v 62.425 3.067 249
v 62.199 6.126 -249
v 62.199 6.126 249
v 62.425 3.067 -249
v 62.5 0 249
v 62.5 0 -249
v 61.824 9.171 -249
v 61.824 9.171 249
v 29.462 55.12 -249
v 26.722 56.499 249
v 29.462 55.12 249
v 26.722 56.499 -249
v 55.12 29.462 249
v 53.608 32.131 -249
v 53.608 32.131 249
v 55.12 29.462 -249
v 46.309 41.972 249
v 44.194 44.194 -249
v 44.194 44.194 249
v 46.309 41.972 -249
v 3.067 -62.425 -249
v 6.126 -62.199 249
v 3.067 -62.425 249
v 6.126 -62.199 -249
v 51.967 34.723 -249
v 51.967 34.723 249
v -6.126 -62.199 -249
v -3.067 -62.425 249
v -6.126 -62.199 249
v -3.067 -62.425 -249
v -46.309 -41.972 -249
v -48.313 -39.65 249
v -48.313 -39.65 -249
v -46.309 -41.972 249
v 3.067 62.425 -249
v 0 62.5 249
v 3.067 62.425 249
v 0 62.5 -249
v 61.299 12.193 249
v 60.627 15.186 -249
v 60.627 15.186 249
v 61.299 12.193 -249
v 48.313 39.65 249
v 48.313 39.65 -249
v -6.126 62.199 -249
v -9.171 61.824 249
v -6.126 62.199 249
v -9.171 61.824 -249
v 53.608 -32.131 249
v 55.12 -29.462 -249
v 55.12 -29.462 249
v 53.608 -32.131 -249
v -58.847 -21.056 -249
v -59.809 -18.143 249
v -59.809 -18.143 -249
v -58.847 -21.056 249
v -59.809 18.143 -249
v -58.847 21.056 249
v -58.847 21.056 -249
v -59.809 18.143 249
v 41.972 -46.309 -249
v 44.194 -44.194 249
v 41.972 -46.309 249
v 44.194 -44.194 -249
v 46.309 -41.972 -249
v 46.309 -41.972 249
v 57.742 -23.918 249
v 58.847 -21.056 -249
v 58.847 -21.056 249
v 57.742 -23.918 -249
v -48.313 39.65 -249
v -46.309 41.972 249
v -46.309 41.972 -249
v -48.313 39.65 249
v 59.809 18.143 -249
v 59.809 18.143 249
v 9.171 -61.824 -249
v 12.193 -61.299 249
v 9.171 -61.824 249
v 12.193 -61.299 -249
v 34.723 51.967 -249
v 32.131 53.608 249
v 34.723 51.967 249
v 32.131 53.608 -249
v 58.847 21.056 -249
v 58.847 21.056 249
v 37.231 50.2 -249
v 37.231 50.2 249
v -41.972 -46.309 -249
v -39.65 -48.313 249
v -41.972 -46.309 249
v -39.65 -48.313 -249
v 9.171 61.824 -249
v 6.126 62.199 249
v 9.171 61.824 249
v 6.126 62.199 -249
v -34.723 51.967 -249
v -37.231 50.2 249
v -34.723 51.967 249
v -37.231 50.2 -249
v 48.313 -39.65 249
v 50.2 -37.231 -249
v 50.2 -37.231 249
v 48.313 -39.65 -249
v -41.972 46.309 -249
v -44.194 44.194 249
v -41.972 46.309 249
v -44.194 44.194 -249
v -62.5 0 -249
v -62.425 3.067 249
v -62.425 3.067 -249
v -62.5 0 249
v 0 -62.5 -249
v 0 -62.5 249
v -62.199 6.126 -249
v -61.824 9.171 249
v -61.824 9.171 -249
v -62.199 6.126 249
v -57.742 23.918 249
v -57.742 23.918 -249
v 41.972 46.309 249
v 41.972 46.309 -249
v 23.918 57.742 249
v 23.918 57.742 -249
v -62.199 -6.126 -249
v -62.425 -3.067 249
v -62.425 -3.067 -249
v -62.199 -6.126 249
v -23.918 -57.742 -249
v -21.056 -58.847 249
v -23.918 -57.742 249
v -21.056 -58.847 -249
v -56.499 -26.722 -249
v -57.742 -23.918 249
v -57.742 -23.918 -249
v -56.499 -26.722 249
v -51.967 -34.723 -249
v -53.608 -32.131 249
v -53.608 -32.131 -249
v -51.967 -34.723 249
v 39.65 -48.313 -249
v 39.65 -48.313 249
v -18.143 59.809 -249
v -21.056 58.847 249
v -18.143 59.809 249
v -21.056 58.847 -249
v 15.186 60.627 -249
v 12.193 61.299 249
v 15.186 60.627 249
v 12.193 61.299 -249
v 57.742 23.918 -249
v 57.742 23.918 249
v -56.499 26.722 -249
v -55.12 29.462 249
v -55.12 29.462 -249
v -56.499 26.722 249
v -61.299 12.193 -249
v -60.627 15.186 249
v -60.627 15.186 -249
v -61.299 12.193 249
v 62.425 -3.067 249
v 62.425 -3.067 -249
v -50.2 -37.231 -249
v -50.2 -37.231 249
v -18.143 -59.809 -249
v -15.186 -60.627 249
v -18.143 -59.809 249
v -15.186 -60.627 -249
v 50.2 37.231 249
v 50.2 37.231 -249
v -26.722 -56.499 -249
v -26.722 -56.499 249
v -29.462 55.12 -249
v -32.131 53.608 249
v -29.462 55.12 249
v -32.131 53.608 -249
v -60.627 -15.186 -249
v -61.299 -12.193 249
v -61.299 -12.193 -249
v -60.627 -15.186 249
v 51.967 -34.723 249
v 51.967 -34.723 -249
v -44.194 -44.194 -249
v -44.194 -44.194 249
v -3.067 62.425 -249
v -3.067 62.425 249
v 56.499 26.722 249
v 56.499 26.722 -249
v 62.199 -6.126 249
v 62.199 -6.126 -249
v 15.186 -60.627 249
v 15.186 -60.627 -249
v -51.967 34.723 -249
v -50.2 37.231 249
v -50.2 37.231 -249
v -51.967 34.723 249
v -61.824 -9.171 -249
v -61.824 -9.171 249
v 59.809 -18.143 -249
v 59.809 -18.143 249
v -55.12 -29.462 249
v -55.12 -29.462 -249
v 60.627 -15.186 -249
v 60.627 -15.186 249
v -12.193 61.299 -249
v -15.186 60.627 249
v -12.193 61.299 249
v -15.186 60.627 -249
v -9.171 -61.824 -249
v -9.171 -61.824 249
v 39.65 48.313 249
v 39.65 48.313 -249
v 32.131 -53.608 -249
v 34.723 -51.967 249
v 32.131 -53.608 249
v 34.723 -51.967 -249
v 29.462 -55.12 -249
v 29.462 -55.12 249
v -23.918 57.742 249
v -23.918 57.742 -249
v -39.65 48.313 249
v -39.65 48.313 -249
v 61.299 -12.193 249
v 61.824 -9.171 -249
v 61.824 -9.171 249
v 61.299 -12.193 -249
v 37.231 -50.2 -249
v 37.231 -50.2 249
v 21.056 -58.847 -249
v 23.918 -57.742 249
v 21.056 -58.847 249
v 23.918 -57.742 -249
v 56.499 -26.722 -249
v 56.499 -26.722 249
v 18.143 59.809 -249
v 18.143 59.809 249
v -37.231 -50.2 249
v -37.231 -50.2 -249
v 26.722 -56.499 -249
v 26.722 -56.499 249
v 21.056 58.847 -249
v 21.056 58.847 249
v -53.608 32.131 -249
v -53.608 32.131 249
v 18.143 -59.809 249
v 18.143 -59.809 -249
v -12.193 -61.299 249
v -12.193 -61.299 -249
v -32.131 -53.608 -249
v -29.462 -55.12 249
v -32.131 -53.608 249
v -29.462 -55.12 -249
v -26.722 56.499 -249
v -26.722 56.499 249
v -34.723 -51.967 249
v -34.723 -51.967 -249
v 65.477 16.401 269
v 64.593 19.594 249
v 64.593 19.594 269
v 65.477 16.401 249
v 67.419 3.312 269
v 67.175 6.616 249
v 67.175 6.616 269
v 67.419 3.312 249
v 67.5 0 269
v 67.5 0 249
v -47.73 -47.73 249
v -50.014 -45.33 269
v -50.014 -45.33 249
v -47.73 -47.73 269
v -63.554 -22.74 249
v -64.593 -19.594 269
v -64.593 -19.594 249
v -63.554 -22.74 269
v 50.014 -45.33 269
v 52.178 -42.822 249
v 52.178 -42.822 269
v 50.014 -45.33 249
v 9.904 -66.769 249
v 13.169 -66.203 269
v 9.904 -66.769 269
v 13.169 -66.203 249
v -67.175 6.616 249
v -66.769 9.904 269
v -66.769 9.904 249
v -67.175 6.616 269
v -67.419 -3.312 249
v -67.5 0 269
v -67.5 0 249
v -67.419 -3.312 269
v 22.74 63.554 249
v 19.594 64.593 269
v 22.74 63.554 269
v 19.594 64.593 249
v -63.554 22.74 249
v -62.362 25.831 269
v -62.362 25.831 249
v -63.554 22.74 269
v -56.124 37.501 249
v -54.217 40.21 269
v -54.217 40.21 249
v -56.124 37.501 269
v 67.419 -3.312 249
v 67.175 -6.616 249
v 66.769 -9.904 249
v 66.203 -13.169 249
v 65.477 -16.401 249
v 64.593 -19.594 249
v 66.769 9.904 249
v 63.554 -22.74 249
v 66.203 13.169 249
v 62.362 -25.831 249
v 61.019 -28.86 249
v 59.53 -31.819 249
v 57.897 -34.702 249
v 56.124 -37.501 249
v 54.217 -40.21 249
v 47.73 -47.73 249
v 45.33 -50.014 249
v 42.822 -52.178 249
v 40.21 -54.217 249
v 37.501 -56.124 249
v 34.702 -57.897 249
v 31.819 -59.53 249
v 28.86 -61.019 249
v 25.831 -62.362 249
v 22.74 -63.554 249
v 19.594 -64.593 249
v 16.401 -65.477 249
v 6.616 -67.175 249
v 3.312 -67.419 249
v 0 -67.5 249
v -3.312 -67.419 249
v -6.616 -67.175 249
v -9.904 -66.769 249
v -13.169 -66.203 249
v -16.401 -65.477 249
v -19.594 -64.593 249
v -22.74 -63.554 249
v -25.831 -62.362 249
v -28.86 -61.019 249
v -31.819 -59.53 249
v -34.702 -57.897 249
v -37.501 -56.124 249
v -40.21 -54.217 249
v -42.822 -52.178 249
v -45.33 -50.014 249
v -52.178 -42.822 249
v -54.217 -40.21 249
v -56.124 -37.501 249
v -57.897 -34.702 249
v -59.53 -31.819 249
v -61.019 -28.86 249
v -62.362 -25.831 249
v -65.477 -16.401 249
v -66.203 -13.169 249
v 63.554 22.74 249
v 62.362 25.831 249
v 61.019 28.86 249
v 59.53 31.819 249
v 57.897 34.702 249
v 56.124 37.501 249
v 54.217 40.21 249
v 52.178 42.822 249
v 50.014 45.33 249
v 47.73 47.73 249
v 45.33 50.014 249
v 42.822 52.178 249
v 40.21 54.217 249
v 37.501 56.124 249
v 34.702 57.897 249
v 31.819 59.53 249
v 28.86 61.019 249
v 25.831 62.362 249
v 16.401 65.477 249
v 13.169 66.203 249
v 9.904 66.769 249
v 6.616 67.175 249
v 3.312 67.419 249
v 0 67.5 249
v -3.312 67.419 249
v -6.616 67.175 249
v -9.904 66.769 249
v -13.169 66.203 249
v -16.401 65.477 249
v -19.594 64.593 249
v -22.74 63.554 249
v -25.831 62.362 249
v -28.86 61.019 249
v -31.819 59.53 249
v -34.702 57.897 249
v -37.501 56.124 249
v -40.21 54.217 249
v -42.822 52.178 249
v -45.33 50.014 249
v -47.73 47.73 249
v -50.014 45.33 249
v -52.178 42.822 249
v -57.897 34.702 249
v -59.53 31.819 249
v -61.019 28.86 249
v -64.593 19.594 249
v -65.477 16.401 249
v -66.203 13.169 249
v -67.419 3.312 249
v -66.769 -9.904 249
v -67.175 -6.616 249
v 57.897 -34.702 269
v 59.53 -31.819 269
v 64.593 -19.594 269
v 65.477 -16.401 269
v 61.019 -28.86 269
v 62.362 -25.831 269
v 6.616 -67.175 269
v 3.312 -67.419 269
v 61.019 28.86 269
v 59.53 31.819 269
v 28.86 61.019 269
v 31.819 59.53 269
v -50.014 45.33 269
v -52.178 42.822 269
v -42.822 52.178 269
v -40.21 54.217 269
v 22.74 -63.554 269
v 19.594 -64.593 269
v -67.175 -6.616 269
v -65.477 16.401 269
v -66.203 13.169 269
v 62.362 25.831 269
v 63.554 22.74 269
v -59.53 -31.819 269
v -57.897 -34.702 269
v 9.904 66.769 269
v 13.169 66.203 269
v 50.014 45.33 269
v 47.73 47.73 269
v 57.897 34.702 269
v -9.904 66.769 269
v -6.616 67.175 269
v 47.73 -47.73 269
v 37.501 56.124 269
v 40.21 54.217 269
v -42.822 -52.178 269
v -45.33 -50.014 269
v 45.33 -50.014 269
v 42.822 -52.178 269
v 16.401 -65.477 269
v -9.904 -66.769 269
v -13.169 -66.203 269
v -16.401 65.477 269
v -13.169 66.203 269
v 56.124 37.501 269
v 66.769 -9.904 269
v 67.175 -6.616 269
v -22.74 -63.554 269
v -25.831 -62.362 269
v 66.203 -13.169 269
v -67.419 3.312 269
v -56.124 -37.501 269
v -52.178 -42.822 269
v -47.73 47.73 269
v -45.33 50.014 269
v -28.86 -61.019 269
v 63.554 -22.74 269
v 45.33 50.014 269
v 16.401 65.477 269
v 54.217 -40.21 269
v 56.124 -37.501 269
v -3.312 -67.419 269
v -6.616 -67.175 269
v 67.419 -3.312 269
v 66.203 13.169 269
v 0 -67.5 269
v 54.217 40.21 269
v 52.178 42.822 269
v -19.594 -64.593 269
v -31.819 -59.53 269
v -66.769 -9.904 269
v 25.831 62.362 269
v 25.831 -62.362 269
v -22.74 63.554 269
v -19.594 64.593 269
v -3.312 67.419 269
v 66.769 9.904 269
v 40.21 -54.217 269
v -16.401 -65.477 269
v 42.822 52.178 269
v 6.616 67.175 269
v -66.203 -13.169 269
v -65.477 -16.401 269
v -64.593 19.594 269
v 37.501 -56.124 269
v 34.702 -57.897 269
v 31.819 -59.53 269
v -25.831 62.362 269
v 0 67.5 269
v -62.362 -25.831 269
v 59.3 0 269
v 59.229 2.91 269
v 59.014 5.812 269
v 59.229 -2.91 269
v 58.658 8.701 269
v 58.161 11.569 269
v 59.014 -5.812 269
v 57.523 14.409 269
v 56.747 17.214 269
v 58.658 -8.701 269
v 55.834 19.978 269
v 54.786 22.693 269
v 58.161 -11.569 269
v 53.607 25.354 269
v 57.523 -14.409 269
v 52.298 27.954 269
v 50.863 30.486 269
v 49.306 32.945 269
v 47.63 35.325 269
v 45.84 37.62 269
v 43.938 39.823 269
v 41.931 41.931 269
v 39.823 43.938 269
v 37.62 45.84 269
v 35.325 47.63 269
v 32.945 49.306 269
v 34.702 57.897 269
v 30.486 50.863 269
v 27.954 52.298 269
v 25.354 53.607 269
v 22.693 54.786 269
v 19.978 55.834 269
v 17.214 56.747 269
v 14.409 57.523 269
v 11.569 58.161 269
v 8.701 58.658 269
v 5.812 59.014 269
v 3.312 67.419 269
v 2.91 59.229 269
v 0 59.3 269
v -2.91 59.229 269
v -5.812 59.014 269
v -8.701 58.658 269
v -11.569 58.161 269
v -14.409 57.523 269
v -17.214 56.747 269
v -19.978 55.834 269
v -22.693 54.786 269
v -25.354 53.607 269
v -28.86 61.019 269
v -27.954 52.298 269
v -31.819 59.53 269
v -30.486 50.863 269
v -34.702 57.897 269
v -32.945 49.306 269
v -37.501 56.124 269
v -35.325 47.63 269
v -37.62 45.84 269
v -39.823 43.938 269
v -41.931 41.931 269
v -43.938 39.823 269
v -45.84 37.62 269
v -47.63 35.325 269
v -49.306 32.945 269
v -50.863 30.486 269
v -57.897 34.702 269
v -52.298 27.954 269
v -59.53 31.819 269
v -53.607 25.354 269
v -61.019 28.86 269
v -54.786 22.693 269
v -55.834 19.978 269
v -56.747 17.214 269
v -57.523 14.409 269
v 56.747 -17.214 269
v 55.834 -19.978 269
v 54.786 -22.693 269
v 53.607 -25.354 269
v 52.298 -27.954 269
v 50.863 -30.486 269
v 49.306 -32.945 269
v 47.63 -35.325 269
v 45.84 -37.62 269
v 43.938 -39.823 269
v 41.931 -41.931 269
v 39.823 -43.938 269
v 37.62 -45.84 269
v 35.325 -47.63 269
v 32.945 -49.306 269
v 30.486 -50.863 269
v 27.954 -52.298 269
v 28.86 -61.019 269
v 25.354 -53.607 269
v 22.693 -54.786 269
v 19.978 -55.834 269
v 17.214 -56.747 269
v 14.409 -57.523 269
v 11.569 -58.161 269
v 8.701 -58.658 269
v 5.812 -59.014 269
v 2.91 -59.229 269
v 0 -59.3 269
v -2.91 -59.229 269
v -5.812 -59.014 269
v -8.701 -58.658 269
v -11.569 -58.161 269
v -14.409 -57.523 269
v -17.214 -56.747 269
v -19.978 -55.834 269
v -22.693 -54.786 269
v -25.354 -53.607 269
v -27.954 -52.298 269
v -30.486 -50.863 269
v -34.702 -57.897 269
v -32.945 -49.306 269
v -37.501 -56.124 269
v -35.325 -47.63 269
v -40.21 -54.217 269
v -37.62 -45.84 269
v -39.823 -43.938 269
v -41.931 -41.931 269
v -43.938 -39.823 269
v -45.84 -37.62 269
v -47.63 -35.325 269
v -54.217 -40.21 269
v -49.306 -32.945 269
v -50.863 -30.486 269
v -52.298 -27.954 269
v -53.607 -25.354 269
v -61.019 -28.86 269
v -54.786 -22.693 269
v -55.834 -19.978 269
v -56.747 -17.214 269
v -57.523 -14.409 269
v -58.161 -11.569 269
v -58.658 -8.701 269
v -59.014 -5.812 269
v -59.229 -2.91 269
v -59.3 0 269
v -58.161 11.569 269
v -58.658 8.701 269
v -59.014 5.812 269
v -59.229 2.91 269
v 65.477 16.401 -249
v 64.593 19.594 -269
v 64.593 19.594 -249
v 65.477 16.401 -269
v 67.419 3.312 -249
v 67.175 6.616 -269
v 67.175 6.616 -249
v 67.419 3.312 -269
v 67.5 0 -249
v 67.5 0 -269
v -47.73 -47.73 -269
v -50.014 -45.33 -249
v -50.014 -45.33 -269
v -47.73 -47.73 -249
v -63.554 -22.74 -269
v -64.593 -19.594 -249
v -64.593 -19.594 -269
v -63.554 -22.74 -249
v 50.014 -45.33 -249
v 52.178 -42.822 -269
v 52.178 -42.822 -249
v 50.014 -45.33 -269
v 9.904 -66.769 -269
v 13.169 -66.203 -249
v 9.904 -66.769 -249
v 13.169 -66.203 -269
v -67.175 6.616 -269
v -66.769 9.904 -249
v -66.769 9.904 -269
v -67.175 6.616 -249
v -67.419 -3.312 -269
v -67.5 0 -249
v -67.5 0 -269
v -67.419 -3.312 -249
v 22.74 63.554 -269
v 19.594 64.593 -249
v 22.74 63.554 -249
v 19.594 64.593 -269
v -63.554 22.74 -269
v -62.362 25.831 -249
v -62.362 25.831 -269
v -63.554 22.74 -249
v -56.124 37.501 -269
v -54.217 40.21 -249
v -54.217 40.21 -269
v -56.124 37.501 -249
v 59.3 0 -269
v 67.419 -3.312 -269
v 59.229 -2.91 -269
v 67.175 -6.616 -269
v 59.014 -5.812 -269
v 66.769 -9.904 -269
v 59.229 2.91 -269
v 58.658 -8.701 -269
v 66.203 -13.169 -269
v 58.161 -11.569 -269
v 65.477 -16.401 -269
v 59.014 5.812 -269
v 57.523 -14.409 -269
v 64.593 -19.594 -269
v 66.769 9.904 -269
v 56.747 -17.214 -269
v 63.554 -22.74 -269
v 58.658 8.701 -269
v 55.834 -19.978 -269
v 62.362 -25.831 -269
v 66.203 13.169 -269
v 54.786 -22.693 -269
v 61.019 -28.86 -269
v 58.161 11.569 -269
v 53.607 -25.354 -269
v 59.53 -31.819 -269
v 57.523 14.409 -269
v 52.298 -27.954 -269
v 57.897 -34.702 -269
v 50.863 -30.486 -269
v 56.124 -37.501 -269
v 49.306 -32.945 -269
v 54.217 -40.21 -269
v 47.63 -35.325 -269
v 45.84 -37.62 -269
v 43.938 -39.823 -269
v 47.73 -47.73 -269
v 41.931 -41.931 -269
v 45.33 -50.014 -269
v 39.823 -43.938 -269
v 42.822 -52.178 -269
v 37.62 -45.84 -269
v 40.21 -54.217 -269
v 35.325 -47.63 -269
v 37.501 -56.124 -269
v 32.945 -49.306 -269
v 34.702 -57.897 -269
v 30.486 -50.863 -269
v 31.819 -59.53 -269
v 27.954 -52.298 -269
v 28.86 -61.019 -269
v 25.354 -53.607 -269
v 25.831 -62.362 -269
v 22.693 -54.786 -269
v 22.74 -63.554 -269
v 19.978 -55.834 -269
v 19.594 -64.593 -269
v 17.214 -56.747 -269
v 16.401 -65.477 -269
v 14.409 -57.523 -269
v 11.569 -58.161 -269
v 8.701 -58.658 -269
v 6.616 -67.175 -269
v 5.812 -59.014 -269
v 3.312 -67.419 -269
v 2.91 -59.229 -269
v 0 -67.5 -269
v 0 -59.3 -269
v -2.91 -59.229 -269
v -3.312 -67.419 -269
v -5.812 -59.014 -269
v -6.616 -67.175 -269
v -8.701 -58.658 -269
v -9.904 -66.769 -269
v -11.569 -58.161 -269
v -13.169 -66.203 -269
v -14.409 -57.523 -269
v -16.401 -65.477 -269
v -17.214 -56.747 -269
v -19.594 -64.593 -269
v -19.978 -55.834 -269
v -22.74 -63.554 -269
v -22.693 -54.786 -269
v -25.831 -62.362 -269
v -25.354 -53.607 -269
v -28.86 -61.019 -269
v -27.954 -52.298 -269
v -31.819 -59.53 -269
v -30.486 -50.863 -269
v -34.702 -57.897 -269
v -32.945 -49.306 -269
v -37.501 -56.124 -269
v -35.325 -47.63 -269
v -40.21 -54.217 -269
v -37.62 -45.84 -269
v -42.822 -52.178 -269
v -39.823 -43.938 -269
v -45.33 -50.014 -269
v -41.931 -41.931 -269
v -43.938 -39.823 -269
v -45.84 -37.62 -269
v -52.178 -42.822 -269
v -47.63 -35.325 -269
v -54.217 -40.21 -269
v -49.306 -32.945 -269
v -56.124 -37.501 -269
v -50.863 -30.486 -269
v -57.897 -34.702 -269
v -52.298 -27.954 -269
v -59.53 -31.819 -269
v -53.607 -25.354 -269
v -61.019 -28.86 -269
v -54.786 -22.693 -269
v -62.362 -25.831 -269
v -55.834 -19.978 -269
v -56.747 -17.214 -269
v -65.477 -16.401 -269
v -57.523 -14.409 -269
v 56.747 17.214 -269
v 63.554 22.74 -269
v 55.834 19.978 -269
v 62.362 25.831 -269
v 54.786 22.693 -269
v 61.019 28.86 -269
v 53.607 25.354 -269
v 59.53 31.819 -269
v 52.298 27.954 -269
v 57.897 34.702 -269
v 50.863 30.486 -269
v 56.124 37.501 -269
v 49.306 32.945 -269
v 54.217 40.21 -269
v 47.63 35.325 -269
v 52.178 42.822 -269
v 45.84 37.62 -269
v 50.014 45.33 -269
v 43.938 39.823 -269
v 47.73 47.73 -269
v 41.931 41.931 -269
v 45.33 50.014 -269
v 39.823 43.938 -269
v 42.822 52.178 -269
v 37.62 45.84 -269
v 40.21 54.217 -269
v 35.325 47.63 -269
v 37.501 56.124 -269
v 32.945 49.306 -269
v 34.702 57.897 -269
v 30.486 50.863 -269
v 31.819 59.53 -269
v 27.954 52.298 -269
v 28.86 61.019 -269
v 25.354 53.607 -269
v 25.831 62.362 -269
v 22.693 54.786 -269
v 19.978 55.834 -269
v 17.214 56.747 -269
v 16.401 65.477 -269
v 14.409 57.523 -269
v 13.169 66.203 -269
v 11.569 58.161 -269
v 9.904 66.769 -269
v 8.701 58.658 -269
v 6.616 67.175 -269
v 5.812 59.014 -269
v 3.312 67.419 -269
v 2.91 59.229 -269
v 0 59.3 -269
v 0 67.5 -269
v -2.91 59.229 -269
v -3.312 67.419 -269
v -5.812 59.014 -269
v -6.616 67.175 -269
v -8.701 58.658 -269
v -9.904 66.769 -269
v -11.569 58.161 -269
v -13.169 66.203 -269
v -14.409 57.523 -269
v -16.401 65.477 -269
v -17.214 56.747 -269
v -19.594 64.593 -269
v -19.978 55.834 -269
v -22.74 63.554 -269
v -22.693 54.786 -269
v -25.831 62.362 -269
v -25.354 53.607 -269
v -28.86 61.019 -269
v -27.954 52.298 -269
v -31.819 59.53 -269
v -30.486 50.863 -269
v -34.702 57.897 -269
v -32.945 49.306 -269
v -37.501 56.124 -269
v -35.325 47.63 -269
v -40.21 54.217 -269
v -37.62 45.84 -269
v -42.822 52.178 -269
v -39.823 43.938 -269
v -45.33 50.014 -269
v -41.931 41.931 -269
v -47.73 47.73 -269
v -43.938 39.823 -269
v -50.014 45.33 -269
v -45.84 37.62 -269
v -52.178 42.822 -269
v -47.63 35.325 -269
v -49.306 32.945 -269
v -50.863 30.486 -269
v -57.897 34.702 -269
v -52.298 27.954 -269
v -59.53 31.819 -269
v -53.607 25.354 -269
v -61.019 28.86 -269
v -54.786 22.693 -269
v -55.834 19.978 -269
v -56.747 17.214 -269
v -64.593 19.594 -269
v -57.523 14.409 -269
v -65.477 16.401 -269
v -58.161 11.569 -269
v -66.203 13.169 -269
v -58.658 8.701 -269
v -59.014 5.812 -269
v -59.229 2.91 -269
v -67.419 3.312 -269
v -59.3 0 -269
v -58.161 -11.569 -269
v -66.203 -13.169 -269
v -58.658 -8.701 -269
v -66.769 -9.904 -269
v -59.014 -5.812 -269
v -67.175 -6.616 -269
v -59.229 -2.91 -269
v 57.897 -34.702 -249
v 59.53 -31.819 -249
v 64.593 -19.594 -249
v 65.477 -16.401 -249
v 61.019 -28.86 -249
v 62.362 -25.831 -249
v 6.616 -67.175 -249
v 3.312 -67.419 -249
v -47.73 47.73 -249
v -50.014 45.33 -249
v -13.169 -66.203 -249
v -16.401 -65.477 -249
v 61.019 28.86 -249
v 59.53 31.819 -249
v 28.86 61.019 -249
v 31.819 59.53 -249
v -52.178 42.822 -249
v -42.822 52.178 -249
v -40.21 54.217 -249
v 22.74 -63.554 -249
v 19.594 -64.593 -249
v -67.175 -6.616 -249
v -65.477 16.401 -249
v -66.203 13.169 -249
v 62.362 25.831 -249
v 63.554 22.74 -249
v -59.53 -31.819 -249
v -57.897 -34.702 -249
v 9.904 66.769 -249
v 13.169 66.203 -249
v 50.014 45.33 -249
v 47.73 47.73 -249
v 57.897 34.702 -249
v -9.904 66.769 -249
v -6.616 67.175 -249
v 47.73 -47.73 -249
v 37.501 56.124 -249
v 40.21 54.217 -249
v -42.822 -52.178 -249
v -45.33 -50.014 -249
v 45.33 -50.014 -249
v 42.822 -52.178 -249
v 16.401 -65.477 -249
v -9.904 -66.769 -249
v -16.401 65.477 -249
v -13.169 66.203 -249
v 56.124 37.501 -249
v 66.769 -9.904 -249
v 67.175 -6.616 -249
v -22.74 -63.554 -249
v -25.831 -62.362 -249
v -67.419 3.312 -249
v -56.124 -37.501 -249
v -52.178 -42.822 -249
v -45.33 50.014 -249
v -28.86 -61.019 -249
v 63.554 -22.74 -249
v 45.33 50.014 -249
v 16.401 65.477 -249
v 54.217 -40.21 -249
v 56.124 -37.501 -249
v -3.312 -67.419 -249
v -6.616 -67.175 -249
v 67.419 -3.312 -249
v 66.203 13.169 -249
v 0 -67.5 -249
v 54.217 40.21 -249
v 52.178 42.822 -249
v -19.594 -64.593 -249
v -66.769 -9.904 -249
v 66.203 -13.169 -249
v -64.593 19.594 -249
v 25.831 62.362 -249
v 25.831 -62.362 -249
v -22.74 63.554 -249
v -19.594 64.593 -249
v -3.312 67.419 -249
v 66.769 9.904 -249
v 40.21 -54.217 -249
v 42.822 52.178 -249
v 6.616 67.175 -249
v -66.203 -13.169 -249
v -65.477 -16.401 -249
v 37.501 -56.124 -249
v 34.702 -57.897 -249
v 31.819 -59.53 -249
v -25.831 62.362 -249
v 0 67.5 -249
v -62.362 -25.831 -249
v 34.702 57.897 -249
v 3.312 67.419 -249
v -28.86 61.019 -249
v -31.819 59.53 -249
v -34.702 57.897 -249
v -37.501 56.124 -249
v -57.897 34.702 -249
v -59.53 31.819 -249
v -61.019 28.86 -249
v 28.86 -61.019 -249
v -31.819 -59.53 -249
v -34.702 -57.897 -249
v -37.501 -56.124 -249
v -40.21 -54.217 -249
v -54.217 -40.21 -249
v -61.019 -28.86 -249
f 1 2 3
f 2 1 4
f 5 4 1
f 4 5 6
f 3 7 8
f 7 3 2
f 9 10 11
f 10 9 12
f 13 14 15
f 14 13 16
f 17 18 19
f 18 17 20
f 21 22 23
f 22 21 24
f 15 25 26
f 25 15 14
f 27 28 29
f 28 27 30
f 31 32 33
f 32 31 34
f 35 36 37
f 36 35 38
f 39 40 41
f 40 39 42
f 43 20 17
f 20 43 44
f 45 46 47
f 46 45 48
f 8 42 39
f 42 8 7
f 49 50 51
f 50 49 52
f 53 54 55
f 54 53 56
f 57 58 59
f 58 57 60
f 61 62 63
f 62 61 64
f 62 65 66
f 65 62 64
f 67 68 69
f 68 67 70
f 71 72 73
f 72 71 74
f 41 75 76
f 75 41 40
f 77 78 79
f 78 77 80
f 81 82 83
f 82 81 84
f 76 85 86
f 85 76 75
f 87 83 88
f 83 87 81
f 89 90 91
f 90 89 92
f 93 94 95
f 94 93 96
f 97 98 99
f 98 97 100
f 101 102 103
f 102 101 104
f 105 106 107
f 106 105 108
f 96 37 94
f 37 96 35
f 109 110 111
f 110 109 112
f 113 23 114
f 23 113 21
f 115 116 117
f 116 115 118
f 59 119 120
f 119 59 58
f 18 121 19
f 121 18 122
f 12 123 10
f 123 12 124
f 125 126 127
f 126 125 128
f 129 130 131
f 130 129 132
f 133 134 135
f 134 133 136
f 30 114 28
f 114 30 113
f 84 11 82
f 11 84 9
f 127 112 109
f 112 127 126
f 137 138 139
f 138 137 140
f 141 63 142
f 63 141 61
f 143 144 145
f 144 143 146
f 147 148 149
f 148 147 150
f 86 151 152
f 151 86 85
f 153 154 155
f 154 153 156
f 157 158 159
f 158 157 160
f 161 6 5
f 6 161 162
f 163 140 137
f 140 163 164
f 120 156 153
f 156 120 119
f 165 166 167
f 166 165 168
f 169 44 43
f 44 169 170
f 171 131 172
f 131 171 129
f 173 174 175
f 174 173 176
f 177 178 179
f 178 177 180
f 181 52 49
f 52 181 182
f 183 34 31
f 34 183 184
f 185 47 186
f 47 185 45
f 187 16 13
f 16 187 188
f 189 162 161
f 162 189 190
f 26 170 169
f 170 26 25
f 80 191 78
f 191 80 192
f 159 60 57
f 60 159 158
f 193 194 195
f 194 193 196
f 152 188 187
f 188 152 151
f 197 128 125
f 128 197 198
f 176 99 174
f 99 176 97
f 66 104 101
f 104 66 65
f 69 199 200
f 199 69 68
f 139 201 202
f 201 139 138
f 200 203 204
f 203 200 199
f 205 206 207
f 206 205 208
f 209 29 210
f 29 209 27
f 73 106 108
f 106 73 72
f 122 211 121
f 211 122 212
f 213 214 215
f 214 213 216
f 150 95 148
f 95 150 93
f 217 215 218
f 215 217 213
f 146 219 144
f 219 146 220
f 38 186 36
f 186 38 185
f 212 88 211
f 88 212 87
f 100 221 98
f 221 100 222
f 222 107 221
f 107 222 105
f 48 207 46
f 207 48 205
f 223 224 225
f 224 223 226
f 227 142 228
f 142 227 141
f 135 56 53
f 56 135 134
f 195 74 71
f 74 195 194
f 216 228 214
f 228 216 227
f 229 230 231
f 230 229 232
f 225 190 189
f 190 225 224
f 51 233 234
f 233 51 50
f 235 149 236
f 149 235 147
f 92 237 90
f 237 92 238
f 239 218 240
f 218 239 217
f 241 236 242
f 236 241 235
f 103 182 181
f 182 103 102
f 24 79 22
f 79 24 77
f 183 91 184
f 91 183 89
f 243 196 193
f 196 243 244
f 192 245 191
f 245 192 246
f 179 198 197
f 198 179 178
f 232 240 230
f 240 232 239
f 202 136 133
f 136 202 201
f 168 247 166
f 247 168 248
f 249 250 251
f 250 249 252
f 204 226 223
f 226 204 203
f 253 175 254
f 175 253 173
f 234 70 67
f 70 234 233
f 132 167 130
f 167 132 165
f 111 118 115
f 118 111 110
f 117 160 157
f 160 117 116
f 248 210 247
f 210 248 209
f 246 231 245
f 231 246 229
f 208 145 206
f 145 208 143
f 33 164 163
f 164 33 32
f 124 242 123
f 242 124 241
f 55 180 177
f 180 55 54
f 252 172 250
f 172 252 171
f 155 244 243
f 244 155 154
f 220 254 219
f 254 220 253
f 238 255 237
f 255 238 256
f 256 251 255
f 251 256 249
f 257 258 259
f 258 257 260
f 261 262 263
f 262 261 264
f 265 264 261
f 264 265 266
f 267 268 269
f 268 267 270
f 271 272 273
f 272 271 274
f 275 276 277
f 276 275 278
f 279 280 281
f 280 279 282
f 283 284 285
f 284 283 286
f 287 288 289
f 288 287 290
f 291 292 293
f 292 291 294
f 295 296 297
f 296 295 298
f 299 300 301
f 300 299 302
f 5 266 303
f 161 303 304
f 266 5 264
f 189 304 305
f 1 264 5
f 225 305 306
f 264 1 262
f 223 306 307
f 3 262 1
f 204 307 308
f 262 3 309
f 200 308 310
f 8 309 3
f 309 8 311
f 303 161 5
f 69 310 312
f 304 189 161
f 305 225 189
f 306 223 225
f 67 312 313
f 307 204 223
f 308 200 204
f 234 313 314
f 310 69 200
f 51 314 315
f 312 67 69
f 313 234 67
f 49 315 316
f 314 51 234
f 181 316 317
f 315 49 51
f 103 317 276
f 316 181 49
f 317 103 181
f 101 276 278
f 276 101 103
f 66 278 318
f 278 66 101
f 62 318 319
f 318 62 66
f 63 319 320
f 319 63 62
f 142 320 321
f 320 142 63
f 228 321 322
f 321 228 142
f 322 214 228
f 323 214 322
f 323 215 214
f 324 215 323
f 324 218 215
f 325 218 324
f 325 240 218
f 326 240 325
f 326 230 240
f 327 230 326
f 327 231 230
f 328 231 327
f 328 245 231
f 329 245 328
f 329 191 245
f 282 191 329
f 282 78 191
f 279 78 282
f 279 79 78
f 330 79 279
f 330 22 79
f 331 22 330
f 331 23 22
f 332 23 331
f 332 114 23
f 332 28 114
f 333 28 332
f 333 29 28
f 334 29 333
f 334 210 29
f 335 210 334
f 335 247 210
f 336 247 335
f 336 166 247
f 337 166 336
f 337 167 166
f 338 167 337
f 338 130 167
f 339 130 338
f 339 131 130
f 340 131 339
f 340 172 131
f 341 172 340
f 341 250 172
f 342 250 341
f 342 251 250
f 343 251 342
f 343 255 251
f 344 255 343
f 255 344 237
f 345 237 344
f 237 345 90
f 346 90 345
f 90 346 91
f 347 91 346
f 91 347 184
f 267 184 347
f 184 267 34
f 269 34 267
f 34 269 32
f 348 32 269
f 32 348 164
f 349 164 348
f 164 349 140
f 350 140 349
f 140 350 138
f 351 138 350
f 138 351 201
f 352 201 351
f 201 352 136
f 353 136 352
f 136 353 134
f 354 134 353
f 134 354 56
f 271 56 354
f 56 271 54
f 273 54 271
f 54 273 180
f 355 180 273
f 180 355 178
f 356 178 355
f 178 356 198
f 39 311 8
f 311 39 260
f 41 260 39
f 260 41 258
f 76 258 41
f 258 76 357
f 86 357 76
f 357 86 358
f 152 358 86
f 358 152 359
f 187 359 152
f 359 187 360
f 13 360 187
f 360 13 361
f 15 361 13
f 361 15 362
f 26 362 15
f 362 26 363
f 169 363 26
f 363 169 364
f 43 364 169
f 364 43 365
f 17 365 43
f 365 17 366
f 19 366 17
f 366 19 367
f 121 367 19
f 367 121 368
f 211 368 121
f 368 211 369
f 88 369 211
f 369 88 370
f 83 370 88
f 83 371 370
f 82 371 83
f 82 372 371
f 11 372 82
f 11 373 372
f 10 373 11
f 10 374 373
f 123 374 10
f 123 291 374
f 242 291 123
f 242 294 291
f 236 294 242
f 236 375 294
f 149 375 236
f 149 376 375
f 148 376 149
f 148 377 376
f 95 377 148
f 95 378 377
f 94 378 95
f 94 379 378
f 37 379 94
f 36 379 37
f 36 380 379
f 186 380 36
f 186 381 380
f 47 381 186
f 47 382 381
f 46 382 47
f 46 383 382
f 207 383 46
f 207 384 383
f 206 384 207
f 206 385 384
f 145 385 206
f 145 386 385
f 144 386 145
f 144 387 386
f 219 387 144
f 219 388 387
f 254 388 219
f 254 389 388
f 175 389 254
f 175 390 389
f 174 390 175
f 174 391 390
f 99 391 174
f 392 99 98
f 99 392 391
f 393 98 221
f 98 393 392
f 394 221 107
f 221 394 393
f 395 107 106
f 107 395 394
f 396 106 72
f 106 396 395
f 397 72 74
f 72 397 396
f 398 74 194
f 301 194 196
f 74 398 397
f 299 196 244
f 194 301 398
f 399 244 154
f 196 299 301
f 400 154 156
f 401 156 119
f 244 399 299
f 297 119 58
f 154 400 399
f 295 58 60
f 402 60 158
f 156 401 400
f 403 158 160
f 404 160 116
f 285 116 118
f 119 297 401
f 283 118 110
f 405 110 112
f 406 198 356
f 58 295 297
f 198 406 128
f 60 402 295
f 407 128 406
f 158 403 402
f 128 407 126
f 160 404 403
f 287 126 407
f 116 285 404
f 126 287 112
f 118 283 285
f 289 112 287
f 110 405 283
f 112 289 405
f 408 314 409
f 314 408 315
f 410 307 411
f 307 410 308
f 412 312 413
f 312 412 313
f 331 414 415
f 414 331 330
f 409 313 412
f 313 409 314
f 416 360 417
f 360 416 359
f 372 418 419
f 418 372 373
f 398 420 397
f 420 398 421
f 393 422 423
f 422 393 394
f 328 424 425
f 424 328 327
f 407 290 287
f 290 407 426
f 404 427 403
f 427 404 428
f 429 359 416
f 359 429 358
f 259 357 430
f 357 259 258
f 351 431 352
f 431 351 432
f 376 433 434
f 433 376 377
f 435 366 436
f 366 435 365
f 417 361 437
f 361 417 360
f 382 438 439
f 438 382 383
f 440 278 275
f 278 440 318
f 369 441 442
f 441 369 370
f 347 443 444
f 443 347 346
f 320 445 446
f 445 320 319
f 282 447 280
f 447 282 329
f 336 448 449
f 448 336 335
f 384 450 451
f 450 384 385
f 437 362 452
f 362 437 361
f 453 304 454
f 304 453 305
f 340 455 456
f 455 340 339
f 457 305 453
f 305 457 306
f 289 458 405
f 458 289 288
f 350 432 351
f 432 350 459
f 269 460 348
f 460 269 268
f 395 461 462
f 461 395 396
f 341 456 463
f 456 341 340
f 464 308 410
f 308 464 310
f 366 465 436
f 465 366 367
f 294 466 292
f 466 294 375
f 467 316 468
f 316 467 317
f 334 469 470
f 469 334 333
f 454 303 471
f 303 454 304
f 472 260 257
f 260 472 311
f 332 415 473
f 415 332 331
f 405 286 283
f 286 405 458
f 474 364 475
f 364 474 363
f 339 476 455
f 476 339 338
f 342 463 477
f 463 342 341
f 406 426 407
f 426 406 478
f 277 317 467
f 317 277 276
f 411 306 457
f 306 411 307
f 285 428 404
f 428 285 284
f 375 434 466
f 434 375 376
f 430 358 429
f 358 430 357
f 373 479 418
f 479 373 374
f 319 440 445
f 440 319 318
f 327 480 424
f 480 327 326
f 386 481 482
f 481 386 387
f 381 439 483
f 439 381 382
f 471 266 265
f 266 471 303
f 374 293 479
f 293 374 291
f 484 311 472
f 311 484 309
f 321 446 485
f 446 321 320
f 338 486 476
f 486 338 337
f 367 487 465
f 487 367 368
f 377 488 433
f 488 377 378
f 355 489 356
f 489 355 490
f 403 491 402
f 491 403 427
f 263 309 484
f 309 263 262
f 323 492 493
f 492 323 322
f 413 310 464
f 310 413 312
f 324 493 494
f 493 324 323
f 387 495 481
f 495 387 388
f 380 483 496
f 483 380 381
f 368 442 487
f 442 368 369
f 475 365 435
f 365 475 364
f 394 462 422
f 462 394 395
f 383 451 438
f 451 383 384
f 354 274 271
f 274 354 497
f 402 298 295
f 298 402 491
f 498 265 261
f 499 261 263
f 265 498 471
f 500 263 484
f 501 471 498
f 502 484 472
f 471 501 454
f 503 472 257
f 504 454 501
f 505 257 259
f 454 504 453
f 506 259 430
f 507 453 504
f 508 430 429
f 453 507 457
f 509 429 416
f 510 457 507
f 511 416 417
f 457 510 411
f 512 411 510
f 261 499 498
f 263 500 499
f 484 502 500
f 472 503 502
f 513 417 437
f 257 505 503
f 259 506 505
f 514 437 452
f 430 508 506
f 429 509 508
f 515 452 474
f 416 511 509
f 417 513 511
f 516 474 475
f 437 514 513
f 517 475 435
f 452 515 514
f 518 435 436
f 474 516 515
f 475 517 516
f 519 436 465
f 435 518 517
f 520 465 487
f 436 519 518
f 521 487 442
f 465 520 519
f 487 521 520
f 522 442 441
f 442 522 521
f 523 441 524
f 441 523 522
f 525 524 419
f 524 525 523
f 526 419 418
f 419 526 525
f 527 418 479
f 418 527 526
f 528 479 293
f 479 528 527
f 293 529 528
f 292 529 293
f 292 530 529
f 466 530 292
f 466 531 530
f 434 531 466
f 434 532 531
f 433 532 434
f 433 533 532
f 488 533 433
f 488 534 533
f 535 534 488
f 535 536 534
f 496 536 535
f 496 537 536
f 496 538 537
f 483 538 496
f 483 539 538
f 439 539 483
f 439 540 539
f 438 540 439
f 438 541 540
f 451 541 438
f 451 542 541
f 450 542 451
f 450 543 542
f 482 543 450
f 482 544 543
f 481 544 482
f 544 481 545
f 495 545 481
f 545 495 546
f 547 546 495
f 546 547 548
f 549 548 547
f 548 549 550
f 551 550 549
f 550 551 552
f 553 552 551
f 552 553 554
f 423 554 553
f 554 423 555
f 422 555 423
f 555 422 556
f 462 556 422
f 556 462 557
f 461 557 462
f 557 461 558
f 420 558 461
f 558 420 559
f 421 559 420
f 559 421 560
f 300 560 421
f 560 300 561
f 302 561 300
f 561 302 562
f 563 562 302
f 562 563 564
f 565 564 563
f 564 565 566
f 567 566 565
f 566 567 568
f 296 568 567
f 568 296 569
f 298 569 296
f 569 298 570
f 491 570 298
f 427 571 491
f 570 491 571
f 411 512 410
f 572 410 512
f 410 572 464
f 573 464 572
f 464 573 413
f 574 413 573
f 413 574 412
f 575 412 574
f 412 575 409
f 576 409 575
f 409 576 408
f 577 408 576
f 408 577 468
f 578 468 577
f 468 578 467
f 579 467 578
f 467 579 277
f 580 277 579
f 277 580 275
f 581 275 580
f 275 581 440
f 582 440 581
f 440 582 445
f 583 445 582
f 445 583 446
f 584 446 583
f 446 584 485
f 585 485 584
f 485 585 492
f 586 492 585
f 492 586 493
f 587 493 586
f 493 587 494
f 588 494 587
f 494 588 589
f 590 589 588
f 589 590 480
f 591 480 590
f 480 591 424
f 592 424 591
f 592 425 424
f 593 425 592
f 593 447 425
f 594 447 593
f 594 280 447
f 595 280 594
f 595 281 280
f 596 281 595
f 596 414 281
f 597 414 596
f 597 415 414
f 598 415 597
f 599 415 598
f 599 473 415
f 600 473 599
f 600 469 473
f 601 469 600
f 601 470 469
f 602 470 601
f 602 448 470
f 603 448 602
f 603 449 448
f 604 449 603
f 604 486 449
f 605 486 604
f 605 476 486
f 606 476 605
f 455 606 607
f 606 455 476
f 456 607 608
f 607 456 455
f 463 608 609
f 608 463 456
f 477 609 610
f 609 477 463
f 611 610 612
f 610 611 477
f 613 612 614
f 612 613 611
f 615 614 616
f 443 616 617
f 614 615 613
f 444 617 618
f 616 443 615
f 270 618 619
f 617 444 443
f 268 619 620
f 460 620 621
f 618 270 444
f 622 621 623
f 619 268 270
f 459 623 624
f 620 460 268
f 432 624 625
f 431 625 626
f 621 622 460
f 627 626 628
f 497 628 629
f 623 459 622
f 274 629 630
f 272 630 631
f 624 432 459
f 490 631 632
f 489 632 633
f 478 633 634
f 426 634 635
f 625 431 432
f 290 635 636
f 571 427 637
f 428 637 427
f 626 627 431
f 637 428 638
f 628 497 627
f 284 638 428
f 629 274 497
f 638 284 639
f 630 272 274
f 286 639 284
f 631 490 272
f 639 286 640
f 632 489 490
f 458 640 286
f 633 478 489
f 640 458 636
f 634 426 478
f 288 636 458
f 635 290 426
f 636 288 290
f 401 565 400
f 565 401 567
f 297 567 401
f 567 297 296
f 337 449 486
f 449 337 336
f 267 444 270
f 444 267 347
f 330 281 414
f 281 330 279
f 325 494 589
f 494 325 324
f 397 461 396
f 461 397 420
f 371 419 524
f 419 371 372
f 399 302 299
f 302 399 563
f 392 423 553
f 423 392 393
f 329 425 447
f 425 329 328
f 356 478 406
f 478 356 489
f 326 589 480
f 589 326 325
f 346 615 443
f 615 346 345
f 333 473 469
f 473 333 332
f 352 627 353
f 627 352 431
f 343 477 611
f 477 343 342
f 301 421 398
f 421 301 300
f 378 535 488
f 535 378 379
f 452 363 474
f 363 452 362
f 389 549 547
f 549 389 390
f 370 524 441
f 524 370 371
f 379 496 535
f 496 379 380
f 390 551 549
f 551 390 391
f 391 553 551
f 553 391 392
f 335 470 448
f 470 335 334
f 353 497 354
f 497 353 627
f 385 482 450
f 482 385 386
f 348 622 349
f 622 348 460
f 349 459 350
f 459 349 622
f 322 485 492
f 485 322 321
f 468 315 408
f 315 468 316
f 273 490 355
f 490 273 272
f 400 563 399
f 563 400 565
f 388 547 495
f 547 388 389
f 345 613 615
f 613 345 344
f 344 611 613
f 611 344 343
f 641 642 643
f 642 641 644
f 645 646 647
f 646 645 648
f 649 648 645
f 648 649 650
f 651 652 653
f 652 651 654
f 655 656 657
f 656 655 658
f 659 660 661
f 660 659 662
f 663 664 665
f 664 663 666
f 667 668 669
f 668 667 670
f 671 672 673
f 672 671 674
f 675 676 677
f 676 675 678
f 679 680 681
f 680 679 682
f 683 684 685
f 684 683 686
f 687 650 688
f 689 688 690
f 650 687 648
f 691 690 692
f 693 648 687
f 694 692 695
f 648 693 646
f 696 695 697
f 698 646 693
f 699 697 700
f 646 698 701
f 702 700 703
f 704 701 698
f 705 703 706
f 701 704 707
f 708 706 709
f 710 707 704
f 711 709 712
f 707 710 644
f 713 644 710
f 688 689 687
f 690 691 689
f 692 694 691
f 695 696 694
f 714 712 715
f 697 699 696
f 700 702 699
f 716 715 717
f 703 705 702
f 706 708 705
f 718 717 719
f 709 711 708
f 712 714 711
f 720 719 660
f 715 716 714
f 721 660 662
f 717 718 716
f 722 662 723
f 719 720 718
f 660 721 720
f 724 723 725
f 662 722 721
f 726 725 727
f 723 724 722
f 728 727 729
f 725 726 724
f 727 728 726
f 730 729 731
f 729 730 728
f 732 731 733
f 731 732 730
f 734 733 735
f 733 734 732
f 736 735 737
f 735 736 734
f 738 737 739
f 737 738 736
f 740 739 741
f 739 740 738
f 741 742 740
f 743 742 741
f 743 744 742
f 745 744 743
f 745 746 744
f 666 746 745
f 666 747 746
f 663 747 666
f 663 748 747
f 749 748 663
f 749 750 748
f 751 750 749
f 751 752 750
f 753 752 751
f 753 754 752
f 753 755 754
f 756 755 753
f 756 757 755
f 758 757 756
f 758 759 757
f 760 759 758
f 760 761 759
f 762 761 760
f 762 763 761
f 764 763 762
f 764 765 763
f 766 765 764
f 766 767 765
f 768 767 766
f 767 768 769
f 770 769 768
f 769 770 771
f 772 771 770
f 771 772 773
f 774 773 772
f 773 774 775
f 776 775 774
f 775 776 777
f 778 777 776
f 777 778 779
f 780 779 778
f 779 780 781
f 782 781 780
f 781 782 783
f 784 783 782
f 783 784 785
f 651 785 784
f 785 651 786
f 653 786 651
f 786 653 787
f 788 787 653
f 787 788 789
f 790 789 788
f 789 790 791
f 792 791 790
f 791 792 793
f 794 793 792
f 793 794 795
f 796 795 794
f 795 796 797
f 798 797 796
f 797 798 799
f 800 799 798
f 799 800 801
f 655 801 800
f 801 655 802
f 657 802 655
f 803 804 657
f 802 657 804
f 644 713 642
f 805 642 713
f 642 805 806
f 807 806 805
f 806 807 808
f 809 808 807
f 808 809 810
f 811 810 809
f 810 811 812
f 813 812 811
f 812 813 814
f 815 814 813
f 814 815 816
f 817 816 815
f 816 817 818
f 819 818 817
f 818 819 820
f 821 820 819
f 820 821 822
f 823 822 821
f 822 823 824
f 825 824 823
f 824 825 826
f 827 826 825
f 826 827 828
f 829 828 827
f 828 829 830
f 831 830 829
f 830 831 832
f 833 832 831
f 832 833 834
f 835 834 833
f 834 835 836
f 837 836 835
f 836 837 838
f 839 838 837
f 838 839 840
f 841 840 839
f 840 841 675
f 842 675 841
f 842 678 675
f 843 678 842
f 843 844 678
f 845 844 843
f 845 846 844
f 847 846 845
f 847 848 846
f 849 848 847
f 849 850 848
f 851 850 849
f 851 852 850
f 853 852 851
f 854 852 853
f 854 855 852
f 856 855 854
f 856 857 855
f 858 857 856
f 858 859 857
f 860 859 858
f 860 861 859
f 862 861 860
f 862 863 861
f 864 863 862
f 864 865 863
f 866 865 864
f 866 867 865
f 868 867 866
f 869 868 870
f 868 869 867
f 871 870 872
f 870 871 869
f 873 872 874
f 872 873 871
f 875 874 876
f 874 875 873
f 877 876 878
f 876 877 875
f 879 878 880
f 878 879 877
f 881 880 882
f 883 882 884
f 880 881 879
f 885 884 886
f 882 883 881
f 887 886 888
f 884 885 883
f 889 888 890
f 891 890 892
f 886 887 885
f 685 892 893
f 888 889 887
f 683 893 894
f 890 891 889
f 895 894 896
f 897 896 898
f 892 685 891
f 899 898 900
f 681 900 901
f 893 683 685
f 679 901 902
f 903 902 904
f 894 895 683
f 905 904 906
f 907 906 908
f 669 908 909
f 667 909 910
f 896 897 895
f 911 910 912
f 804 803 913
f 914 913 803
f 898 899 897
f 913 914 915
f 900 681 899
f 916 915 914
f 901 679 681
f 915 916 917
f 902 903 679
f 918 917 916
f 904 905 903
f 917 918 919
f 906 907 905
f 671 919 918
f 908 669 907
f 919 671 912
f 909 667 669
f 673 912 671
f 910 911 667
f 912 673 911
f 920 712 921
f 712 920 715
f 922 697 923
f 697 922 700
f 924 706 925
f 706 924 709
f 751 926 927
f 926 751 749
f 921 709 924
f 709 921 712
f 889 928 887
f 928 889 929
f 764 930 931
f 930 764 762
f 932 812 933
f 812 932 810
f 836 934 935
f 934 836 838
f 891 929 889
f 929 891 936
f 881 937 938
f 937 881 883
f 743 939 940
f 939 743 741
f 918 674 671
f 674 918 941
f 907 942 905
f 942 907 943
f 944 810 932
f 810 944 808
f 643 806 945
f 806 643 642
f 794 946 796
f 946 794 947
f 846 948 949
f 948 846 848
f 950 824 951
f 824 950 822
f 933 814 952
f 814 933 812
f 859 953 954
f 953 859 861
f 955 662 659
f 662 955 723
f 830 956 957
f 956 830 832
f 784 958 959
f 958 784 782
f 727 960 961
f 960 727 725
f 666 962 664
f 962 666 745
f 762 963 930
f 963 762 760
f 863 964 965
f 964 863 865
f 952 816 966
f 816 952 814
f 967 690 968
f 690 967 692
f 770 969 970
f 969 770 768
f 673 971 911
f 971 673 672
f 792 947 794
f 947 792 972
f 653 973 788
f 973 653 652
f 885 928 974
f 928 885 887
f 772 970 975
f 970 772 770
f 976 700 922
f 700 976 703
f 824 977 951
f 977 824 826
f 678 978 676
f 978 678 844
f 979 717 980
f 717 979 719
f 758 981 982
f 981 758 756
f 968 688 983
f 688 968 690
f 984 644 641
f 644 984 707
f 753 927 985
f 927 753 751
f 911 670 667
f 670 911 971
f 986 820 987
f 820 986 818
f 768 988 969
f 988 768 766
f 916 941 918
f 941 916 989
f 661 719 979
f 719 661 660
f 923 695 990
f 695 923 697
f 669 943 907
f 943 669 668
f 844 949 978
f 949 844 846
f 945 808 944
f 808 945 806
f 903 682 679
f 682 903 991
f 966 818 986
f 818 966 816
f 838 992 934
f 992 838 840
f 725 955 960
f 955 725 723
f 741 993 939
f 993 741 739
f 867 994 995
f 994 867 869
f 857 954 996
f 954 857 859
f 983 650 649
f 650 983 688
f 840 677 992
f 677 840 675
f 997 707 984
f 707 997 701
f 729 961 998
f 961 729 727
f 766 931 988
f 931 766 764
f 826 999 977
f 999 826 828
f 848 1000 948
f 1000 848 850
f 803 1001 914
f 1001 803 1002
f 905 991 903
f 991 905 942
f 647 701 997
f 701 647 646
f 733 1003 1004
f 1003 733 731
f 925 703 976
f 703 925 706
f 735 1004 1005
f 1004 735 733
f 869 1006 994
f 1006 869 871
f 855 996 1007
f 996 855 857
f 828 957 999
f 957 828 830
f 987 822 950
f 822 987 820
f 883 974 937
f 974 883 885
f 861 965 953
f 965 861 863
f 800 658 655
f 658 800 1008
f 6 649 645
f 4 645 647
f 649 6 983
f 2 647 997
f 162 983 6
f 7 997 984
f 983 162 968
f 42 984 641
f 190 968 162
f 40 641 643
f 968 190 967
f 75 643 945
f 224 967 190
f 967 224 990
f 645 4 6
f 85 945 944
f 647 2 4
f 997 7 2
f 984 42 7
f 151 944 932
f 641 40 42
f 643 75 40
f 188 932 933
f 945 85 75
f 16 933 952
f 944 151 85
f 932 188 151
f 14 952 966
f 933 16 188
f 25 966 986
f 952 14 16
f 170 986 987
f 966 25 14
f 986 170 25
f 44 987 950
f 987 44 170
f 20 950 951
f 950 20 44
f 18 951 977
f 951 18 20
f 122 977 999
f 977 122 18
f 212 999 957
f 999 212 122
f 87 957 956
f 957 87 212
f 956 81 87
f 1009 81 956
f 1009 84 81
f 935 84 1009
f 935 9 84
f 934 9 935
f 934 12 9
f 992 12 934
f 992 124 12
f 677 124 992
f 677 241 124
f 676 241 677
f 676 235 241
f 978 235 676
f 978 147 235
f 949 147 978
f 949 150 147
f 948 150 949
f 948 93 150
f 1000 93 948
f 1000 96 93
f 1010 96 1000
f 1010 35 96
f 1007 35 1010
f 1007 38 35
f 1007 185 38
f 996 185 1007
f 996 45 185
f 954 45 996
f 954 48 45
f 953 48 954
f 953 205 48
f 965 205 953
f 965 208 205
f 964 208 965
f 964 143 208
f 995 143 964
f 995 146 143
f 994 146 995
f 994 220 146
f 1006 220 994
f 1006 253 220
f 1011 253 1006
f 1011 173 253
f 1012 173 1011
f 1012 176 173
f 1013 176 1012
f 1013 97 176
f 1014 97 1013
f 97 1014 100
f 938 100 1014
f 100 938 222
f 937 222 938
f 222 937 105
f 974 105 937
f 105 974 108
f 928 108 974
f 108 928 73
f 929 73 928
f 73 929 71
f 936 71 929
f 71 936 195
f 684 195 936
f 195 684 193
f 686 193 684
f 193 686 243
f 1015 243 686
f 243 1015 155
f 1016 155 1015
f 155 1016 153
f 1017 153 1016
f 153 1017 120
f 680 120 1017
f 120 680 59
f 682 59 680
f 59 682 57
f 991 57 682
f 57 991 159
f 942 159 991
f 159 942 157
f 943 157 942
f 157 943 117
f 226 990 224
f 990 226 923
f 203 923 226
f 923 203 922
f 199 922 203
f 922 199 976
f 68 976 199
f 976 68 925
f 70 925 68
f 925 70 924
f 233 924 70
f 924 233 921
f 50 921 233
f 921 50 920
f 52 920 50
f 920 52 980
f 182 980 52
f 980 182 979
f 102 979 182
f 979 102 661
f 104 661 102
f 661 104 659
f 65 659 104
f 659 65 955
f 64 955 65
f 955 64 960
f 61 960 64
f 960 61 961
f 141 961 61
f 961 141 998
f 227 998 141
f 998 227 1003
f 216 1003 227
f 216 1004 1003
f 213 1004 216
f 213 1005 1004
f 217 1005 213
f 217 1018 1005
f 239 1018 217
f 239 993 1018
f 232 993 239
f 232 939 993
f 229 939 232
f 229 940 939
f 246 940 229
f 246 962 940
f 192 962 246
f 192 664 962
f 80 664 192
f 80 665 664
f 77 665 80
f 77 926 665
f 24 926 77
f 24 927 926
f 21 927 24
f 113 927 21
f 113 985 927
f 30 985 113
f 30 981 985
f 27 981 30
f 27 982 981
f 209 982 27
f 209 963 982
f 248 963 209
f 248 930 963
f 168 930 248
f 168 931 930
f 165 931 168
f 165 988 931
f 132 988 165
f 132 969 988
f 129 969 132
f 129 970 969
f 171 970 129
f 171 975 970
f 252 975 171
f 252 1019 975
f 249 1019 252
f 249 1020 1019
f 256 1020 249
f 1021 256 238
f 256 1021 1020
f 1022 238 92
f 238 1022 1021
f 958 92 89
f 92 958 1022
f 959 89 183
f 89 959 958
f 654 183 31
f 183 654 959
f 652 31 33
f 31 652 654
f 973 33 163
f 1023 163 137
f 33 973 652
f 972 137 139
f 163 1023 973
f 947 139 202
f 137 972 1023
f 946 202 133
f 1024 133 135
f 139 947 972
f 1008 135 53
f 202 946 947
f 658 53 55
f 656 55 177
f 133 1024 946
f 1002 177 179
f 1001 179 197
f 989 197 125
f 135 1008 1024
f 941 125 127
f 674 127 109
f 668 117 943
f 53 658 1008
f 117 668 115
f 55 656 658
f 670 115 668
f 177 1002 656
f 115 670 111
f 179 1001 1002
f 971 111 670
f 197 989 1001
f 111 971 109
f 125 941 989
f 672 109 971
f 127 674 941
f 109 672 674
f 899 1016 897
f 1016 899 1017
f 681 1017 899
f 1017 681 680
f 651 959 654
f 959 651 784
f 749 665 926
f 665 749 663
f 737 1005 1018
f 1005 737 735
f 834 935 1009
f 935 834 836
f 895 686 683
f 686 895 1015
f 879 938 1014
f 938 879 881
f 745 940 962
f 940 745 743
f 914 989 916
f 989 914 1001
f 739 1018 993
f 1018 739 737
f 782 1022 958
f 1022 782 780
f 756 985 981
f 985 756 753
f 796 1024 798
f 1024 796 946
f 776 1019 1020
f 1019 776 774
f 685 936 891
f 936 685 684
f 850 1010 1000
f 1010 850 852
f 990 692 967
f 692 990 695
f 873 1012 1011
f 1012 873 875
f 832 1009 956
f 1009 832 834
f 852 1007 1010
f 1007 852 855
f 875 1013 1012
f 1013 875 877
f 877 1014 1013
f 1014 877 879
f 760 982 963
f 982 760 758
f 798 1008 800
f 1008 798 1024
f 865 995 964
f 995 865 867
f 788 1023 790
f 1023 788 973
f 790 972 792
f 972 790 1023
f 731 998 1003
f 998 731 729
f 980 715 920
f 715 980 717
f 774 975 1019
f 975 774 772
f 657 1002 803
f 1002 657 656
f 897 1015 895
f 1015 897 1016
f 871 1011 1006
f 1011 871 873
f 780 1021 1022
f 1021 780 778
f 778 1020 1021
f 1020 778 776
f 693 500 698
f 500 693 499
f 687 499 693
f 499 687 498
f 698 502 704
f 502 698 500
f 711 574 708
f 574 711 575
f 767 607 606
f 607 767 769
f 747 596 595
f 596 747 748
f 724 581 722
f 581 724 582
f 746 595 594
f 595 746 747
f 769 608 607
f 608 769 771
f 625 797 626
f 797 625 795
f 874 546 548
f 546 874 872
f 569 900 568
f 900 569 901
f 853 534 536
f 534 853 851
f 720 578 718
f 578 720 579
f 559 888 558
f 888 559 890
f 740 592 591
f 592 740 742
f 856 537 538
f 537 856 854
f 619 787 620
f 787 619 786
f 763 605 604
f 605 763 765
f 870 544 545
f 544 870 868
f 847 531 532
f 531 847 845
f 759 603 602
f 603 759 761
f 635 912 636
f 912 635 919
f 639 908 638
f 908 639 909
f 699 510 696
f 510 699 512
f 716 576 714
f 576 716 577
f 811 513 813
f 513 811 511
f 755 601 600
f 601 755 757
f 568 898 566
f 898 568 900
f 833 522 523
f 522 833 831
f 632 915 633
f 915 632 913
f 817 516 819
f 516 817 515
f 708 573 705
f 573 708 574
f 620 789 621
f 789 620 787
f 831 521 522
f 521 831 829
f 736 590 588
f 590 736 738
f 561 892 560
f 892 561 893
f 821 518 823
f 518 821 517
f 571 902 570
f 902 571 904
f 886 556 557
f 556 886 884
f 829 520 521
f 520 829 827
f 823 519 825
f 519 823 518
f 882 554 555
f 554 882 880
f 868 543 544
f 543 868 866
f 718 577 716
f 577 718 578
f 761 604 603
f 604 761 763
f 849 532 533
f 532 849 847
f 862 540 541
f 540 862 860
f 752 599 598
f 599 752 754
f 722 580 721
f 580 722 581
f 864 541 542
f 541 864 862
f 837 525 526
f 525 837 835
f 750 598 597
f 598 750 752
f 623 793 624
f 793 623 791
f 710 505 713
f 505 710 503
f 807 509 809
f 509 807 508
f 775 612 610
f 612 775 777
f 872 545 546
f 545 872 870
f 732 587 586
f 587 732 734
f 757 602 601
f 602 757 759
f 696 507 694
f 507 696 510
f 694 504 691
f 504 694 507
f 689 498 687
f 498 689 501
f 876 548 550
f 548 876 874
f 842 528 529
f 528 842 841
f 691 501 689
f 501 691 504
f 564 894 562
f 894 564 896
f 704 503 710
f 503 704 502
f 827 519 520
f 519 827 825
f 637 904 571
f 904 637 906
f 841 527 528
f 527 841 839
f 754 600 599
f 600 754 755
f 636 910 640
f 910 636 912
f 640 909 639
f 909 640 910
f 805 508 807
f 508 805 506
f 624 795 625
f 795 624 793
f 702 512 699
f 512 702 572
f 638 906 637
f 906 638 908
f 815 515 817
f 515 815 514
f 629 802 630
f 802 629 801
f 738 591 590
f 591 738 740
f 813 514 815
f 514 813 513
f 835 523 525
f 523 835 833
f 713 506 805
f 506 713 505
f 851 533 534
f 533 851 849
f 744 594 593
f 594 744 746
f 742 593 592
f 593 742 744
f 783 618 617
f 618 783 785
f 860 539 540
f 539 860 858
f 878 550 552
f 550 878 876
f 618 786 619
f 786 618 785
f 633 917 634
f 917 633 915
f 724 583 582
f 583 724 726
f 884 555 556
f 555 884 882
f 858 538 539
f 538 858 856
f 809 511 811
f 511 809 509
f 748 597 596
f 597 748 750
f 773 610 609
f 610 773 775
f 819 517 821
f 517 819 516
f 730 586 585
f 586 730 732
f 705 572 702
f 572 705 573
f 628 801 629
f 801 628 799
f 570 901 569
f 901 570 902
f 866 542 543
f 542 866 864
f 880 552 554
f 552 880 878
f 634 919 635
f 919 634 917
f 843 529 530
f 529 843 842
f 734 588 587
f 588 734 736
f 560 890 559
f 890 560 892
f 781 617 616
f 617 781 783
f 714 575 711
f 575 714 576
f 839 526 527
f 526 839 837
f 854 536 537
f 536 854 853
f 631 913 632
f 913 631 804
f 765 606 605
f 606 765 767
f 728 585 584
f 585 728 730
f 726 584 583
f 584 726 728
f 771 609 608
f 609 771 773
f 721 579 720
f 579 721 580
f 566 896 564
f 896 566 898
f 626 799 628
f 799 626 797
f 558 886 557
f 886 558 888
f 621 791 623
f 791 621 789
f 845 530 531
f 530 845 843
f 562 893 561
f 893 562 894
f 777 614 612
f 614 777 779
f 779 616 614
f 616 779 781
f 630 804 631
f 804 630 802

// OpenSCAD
$fn = 128;

module ht_pipe_segment(length = 500) {
    ht_pipe(diameter = 125, length = length);
}

module ht_pipe(diameter, length) {
    outer_d = diameter;
    wall_t  = 3.2;                 // typical HT wall thickness (approx)
    inner_d = outer_d - 2*wall_t;

    socket_len = 20;               // end fitting length
    socket_d   = diameter + 10;    // end fitting outer diameter
    overlap    = 1;                // small overlap to guarantee union

    // Build as ONE connected solid: outer union minus inner voids
    difference() {
        union() {
            // Main outer pipe body
            cylinder(d = outer_d, h = length, center = true);

            // Top socket (connected by overlap)
            translate([0, 0, length/2 - overlap + socket_len/2])
                cylinder(d = socket_d, h = socket_len, center = true);

            // Bottom socket (connected by overlap)
            translate([0, 0, -length/2 + overlap - socket_len/2])
                cylinder(d = socket_d, h = socket_len, center = true);
        }

        // Main inner bore (through entire pipe)
        cylinder(d = inner_d, h = length + 0.2, center = true);

        // Socket inner reliefs (keep wall thickness consistent inside sockets)
        translate([0, 0, length/2 - overlap + socket_len/2])
            cylinder(d = inner_d, h = socket_len + 0.2, center = true);

        translate([0, 0, -length/2 + overlap - socket_len/2])
            cylinder(d = inner_d, h = socket_len + 0.2, center = true);
    }
}

ht_pipe_segment(500);
